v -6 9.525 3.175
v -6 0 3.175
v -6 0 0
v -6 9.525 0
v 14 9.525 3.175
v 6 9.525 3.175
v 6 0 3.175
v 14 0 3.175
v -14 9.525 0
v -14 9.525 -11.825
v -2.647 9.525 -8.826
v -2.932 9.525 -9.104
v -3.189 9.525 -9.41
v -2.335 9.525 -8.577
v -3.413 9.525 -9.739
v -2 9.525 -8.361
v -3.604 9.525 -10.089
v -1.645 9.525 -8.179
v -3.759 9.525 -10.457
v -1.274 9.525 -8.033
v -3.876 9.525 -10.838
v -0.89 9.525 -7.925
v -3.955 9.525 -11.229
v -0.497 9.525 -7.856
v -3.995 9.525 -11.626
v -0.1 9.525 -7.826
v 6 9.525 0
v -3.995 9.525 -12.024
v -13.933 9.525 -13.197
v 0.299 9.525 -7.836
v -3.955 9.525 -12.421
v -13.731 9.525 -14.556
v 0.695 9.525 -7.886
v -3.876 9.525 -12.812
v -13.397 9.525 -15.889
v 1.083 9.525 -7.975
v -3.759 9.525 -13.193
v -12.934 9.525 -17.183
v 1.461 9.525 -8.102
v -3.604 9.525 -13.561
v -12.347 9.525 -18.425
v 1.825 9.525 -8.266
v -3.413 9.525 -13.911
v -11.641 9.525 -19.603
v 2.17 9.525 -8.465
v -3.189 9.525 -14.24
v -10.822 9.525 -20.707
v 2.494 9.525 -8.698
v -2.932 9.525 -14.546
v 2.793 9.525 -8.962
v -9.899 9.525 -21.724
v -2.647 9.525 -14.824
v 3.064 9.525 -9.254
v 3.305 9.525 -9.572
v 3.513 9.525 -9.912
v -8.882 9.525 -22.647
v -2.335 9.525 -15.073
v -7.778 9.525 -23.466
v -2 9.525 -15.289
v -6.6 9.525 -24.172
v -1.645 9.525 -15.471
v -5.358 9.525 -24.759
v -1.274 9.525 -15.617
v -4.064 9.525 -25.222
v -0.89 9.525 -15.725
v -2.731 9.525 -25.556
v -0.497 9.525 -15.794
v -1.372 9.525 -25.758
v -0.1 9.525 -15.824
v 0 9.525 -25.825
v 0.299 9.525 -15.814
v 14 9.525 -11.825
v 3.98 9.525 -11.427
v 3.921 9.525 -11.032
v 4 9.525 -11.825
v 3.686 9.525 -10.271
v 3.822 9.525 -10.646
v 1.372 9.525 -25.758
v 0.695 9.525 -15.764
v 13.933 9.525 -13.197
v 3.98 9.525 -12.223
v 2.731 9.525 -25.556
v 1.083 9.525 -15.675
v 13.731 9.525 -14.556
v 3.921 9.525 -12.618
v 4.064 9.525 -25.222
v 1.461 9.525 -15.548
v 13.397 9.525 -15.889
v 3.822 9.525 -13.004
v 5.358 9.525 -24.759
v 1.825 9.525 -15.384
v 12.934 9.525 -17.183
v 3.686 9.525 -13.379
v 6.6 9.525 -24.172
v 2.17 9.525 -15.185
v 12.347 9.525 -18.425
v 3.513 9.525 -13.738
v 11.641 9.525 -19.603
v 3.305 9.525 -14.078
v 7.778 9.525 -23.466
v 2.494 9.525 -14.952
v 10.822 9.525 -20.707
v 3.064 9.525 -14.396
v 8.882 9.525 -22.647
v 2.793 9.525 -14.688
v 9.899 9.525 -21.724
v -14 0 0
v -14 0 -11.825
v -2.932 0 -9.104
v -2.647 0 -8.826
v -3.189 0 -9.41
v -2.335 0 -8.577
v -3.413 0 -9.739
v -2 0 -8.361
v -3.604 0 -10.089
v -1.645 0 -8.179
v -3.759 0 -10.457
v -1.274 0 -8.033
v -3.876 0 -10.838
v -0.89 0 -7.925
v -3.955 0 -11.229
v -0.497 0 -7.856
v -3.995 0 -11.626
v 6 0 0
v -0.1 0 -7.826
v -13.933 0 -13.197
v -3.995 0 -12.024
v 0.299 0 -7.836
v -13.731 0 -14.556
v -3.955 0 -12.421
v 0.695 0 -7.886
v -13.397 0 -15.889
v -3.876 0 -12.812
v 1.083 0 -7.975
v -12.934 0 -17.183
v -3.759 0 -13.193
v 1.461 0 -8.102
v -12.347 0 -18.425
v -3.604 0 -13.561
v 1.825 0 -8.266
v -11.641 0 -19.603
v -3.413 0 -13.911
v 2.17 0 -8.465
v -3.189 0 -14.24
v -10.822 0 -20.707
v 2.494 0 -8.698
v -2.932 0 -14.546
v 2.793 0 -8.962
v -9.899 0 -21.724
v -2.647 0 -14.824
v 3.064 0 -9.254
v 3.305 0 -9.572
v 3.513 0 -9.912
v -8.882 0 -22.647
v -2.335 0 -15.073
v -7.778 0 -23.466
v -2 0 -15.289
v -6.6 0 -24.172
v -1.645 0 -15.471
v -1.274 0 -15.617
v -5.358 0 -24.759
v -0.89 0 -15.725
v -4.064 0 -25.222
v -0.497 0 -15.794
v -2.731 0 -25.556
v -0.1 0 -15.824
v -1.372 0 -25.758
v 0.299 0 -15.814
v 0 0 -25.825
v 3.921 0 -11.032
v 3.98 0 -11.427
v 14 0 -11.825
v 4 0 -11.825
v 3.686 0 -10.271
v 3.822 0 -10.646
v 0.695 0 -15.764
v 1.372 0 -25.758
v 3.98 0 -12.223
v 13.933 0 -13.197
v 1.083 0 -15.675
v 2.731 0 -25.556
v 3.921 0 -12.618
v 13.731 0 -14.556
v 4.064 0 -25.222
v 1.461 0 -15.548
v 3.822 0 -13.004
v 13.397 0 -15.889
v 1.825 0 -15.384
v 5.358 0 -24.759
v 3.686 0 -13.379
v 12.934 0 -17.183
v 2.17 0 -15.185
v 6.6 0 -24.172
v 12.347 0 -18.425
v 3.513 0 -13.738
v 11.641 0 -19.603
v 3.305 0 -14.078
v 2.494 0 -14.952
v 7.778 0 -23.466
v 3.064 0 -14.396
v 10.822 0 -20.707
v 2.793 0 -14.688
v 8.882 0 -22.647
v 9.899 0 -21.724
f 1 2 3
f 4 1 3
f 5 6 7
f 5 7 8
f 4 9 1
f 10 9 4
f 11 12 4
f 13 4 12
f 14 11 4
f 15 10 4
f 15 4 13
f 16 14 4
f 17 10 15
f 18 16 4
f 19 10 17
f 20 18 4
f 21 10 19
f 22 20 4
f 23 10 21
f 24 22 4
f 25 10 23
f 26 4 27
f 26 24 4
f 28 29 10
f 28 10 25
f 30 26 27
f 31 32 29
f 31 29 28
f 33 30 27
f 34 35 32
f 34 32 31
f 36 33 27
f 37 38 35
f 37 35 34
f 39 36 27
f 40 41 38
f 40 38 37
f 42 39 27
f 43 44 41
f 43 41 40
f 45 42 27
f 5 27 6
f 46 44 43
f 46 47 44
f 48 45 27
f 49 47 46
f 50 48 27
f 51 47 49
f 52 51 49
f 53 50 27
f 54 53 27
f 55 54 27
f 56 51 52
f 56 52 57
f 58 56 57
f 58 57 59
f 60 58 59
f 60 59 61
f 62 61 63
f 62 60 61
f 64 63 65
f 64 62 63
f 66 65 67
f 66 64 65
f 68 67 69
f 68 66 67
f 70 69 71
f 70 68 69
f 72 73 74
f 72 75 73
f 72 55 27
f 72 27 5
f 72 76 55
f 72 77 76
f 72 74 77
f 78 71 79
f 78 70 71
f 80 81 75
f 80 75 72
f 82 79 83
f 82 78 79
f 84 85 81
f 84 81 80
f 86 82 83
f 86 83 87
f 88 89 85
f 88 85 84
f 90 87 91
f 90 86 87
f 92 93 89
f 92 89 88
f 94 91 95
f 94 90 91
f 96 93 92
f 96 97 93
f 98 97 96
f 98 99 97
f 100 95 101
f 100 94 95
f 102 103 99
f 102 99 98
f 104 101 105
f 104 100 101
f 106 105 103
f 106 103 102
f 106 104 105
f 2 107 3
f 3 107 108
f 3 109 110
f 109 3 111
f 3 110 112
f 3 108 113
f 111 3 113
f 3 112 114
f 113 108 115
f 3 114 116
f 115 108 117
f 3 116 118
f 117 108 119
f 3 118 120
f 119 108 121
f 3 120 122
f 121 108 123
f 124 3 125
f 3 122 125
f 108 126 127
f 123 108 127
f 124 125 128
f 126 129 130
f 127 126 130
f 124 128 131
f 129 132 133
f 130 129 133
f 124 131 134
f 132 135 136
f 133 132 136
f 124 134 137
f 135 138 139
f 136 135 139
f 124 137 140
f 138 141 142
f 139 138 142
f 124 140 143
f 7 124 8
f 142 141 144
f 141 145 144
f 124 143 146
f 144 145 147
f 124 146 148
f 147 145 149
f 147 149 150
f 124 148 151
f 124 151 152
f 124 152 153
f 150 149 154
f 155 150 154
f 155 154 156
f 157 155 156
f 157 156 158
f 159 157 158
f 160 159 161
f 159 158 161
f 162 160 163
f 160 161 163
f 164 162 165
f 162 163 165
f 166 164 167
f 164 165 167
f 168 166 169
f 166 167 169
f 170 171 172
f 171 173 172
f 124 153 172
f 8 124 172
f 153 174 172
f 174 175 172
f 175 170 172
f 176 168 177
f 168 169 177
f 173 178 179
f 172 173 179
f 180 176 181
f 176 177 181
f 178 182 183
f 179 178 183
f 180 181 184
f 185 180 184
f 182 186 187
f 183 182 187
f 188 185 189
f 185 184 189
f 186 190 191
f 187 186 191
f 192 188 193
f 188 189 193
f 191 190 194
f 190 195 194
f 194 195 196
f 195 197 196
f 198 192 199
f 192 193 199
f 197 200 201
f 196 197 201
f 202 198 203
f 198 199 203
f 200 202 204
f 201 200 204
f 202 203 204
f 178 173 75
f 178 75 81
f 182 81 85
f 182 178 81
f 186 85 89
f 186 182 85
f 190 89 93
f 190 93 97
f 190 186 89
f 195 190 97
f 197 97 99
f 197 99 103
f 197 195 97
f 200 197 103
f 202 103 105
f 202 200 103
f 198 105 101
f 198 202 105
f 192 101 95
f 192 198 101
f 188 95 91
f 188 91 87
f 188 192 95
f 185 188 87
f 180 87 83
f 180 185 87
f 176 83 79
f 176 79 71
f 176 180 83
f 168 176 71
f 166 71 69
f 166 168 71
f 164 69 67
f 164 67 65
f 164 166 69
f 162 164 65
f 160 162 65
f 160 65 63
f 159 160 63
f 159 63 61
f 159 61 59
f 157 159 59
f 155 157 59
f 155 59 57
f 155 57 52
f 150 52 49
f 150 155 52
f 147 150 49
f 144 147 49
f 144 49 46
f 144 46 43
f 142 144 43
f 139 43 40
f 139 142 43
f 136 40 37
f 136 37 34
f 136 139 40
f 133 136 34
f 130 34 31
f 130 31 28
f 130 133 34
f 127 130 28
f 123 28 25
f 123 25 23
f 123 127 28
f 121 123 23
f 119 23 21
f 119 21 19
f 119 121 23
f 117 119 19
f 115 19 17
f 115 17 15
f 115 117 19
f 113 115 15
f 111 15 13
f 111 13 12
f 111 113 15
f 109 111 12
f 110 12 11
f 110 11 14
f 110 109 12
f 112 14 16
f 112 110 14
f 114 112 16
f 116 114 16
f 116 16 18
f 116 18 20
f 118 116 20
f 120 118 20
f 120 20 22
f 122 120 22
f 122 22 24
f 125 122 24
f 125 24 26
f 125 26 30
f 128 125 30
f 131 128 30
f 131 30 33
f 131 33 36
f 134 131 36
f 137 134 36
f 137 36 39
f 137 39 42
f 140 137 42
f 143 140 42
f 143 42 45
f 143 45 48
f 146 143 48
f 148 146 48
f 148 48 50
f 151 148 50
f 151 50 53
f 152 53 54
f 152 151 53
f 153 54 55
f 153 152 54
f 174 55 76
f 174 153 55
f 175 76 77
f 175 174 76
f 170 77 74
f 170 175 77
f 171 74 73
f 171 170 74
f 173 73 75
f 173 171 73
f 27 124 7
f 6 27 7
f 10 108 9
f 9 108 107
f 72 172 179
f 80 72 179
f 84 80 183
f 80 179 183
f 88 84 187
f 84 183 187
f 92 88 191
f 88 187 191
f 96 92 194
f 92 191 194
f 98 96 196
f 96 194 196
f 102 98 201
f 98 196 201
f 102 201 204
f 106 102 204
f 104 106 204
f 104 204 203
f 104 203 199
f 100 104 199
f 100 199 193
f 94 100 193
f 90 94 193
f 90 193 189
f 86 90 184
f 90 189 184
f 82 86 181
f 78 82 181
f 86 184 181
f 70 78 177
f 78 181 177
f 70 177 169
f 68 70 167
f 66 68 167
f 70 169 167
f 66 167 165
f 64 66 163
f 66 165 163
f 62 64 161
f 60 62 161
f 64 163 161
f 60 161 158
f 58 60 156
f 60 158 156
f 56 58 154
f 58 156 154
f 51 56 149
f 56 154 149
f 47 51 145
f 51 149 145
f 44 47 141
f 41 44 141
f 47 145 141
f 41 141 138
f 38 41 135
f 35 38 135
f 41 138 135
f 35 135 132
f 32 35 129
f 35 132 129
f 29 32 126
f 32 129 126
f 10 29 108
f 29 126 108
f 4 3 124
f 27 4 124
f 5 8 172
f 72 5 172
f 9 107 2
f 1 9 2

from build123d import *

# Parameters (mm, degrees)
SKETCH1_R           = 4
BOSS_EXTRUDE1_DEPTH = 9.525


with BuildPart() as part:
    # Sketch1 → Boss-Extrude1 (new body)
    with BuildSketch(Plane(origin=(0, 0, 0), x_dir=(1, 0, 0), z_dir=(0, 1, 0))):
        with BuildLine():
            Line((-6, 0), (0, 0))
            Line((0, 0), (6, 0))
            Line((6, 0), (6, -3.175))
            Line((6, -3.175), (14, -3.175))
            Line((14, -3.175), (14, 11.825))
            ThreePointArc((14, 11.825), (0, 25.825), (-14, 11.825))
            Line((-14, 11.825), (-14, 0))
            Line((-14, 0), (-6, -3.175))
            Line((-6, -3.175), (-6, 0))
        make_face()
        with Locations((0, 11.825)):
            Circle(SKETCH1_R, mode=Mode.SUBTRACT)
    extrude(amount=BOSS_EXTRUDE1_DEPTH)


solid = part.part
